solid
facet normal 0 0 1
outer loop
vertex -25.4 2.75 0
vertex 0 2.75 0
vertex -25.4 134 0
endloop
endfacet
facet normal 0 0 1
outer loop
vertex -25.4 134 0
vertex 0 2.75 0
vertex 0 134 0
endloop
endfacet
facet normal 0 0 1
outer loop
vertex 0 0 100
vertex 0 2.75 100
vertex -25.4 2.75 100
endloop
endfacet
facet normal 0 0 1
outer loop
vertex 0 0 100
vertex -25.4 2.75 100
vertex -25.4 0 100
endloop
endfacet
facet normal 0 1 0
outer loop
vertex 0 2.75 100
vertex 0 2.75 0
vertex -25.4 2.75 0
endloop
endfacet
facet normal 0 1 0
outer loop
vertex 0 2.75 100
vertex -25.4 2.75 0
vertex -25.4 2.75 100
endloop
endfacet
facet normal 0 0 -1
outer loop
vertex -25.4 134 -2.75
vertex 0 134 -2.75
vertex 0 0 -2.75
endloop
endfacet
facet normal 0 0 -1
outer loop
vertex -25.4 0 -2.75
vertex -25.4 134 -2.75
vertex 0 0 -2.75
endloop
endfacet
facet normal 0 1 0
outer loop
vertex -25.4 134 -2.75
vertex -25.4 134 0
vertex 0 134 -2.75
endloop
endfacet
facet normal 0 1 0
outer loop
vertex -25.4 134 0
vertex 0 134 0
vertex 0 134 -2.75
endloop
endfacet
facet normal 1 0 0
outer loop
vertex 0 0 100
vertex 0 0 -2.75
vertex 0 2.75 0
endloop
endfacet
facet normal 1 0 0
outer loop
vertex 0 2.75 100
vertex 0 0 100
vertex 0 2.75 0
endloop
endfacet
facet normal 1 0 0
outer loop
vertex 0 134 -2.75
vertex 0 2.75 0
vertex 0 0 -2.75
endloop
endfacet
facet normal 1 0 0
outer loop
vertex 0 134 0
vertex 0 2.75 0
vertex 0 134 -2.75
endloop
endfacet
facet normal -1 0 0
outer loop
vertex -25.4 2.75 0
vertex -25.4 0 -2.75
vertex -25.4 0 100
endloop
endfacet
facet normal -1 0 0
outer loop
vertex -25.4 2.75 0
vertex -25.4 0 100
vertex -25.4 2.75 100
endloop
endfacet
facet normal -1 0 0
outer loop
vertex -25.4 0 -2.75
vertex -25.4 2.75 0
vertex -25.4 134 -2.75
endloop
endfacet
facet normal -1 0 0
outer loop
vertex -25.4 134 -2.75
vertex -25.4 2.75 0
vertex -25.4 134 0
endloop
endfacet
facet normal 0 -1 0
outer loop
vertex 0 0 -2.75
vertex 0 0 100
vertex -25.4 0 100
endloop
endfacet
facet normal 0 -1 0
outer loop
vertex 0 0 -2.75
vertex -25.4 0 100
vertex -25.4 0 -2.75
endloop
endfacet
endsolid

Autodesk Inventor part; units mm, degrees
ref_plane "YZ Plane" through (0, 0, 0) normal (1, 0, 0) x (0, 1, 0)
ref_plane "XZ Plane" through (0, 0, 0) normal (0, 1, 0) x (-1, 0, 0)
ref_plane "XY Plane" through (0, 0, 0) normal (0, 0, 1) x (1, 0, 0)
sketch "Sketch1" plane through (0, 0, 0) normal (1, 0, 0) x (0, 1, 0)
  line L0 (0, 0) -> (134, 0)
  line L1 (134, 0) -> (134, -2.75)
  line L2 (134, -2.75) -> (0, -2.75)
  line L3 (0, -2.75) -> (0, 0)
  line L4 (0, 0) -> (2.75, 0)
  line L5 (2.75, 0) -> (2.75, 100)
  line L6 (2.75, 100) -> (0, 100)
  line L7 (0, 100) -> (0, 0)
  dimension "d0" = 134
  dimension "d1" = 2.75
  dimension "d2" = 2.75
  dimension "d3" = 100
extrude "Extrusion1" add sketch "Sketch1" against normal blind 25.4
properties part number "PLETINA NEMA CAJA"
